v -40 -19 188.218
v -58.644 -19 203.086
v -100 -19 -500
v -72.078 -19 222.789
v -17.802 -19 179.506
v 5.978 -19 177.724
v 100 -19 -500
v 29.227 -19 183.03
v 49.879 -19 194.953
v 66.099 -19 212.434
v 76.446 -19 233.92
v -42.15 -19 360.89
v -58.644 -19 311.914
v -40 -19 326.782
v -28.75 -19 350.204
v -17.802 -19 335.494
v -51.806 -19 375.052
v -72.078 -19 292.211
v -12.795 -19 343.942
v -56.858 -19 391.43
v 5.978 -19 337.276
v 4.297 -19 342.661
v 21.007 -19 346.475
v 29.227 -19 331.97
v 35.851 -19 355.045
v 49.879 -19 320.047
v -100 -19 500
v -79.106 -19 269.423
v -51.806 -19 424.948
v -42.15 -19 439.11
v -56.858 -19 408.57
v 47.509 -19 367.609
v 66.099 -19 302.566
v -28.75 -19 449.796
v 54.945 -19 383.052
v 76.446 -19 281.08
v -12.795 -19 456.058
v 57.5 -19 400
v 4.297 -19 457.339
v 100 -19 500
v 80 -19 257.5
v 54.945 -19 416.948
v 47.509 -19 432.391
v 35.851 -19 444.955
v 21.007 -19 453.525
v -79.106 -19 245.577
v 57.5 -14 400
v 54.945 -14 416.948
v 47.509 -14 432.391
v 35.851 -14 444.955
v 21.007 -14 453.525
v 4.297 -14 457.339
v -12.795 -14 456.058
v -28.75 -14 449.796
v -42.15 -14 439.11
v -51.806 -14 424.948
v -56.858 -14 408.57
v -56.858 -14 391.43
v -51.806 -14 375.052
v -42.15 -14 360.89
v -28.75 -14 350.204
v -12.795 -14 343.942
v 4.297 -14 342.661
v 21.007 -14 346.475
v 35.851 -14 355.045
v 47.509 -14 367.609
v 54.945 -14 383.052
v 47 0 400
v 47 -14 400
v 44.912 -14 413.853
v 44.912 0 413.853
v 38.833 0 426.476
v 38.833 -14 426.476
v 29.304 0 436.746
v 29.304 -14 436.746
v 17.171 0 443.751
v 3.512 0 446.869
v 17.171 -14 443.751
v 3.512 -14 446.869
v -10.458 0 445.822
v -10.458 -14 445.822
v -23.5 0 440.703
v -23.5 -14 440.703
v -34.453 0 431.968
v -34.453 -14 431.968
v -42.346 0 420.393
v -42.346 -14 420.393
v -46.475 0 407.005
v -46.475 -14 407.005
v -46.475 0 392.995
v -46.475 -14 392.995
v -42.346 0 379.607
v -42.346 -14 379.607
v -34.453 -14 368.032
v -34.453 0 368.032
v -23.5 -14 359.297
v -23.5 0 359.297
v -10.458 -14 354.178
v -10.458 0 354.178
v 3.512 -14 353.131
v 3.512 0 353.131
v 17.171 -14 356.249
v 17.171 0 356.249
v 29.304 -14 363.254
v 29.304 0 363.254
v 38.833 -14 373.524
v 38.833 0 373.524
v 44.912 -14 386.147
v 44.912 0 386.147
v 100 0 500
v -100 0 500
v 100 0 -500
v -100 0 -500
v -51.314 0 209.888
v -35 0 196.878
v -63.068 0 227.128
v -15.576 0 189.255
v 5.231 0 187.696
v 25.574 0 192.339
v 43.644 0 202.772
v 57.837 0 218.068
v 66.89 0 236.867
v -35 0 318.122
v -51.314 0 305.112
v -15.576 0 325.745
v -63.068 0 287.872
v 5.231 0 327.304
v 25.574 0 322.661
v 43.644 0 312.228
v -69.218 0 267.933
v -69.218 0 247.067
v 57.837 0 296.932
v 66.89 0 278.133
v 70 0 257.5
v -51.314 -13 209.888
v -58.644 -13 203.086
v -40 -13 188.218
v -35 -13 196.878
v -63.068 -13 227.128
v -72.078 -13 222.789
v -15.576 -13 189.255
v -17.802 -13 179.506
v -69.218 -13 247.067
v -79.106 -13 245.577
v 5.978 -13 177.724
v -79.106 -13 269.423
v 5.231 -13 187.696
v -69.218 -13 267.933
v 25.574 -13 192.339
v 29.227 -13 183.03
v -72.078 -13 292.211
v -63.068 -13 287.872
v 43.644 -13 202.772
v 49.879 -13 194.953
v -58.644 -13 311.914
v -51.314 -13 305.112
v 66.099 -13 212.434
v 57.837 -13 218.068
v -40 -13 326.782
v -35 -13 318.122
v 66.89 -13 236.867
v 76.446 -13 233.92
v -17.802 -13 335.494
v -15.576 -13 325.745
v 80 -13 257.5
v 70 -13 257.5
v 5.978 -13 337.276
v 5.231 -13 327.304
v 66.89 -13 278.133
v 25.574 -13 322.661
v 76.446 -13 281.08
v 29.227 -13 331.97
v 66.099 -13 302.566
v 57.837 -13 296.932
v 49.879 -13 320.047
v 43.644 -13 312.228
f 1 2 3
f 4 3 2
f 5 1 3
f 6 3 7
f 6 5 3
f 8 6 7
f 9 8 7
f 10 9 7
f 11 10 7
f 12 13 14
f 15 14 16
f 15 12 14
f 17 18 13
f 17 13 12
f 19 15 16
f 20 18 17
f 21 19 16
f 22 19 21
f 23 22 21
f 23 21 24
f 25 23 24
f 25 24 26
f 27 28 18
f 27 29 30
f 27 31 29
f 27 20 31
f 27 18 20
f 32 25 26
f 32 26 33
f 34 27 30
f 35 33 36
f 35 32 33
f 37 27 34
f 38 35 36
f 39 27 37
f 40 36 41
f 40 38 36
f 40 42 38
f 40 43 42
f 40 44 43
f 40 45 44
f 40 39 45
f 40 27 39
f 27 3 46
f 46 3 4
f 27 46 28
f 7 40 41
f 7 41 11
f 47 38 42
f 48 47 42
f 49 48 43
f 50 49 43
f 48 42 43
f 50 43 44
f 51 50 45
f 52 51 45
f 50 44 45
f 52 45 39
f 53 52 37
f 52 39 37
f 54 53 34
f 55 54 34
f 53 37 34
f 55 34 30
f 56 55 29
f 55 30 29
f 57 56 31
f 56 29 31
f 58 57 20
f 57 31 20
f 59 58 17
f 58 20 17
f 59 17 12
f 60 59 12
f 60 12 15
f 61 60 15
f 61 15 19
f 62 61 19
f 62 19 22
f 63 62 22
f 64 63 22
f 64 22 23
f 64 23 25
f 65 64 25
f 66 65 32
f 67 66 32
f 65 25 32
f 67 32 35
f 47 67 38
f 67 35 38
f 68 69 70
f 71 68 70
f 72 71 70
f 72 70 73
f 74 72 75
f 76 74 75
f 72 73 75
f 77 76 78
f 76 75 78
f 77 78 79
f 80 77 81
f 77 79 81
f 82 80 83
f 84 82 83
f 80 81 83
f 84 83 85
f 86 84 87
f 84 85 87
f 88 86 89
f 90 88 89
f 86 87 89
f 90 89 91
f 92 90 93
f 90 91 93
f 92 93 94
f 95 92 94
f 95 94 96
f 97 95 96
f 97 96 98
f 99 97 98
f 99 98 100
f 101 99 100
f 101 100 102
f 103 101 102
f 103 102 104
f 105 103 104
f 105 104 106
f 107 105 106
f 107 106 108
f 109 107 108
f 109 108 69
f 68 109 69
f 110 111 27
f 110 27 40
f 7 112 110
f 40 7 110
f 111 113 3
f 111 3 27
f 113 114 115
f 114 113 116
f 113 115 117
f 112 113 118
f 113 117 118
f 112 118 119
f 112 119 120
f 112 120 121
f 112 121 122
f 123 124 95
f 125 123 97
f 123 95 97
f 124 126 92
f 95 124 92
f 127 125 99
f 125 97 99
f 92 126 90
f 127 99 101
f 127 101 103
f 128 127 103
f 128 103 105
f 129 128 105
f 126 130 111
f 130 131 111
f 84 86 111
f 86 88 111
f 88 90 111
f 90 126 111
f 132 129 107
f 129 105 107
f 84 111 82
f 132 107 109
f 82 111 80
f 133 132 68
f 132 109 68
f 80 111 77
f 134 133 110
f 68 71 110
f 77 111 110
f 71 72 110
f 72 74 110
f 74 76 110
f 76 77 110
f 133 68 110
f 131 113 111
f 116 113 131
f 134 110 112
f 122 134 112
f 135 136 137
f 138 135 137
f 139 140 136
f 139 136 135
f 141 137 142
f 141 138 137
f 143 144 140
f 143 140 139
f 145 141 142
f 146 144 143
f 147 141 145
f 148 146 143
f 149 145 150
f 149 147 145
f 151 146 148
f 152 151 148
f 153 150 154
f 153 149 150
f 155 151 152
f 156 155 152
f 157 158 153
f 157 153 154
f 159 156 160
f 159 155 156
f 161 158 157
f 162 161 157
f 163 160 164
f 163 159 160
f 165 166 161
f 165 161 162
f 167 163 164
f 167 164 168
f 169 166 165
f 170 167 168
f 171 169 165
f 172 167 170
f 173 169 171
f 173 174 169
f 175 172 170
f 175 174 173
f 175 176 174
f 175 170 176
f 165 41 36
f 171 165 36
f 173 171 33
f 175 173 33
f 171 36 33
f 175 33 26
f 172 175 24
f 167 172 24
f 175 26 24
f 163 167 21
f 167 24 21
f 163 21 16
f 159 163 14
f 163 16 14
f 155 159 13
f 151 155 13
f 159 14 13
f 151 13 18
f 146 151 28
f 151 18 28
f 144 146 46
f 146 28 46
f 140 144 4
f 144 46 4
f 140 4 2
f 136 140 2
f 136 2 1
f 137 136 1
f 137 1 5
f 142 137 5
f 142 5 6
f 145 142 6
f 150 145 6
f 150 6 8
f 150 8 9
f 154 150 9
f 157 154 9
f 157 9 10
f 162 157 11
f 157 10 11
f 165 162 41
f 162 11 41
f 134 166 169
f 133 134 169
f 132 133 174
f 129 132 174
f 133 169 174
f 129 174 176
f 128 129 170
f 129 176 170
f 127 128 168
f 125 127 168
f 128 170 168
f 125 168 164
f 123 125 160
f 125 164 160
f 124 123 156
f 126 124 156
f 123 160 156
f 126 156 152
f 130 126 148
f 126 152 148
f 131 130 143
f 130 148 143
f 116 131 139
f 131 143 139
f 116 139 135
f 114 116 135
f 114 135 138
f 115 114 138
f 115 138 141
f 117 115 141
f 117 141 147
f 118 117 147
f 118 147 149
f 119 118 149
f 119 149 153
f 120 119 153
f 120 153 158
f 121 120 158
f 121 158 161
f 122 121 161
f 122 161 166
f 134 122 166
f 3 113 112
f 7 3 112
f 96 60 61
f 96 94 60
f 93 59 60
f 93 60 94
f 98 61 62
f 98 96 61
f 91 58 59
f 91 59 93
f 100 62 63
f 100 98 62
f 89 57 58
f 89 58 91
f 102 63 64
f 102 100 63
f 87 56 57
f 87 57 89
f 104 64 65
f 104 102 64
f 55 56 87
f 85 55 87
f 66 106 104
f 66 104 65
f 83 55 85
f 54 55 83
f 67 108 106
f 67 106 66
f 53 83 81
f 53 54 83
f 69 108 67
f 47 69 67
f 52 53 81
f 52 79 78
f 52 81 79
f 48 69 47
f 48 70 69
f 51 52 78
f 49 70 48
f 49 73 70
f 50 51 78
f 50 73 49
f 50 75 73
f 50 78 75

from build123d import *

# Parameters (mm, degrees)
F0_W     = 200
F0_H     = 1000
F1_DEPTH = 19
F2_R     = 57.5
F3_DEPTH = 5
F4_R     = 47
F5_DEPTH = 25
F6_R     = 80
F7_DEPTH = 6
F8_R     = 70
F9_DEPTH = 25


# Not quite as in the source:
# - a feature names something its author has since deleted; it is built from what else it names


with BuildPart() as f1:
    # F0 (on Front) → F1 (new body)
    with BuildSketch(Plane.XZ):
        Rectangle(F0_W, F0_H)
    extrude(amount=F1_DEPTH)

    # F2 (on face) → F3 (cut)
    with BuildSketch(Plane.XZ.offset(19)):
        with Locations((0, 400)):
            Circle(F2_R)
    extrude(amount=-F3_DEPTH, mode=Mode.SUBTRACT)

    # F4 (on face) → F5 (cut)
    with BuildSketch(Plane.XZ.offset(19)):
        with Locations((0, 400)):
            Circle(F4_R)
    extrude(amount=-F5_DEPTH, mode=Mode.SUBTRACT)

    # F6 (on face) → F7 (cut)
    with BuildSketch(Plane.XZ.offset(19)):
        with Locations((0, 257.5)):
            Circle(F6_R)
    extrude(amount=-F7_DEPTH, mode=Mode.SUBTRACT)

    # F8 (on face) + F0 (on Front) → F9 (cut)
    with BuildSketch(Plane.XZ.offset(19)):
        with Locations((0, 257.5)):
            Circle(F8_R)
    with BuildSketch(Plane.XZ):
        Rectangle(F0_W, F0_H)
    extrude(amount=-F9_DEPTH, mode=Mode.SUBTRACT)


solid = f1.part
